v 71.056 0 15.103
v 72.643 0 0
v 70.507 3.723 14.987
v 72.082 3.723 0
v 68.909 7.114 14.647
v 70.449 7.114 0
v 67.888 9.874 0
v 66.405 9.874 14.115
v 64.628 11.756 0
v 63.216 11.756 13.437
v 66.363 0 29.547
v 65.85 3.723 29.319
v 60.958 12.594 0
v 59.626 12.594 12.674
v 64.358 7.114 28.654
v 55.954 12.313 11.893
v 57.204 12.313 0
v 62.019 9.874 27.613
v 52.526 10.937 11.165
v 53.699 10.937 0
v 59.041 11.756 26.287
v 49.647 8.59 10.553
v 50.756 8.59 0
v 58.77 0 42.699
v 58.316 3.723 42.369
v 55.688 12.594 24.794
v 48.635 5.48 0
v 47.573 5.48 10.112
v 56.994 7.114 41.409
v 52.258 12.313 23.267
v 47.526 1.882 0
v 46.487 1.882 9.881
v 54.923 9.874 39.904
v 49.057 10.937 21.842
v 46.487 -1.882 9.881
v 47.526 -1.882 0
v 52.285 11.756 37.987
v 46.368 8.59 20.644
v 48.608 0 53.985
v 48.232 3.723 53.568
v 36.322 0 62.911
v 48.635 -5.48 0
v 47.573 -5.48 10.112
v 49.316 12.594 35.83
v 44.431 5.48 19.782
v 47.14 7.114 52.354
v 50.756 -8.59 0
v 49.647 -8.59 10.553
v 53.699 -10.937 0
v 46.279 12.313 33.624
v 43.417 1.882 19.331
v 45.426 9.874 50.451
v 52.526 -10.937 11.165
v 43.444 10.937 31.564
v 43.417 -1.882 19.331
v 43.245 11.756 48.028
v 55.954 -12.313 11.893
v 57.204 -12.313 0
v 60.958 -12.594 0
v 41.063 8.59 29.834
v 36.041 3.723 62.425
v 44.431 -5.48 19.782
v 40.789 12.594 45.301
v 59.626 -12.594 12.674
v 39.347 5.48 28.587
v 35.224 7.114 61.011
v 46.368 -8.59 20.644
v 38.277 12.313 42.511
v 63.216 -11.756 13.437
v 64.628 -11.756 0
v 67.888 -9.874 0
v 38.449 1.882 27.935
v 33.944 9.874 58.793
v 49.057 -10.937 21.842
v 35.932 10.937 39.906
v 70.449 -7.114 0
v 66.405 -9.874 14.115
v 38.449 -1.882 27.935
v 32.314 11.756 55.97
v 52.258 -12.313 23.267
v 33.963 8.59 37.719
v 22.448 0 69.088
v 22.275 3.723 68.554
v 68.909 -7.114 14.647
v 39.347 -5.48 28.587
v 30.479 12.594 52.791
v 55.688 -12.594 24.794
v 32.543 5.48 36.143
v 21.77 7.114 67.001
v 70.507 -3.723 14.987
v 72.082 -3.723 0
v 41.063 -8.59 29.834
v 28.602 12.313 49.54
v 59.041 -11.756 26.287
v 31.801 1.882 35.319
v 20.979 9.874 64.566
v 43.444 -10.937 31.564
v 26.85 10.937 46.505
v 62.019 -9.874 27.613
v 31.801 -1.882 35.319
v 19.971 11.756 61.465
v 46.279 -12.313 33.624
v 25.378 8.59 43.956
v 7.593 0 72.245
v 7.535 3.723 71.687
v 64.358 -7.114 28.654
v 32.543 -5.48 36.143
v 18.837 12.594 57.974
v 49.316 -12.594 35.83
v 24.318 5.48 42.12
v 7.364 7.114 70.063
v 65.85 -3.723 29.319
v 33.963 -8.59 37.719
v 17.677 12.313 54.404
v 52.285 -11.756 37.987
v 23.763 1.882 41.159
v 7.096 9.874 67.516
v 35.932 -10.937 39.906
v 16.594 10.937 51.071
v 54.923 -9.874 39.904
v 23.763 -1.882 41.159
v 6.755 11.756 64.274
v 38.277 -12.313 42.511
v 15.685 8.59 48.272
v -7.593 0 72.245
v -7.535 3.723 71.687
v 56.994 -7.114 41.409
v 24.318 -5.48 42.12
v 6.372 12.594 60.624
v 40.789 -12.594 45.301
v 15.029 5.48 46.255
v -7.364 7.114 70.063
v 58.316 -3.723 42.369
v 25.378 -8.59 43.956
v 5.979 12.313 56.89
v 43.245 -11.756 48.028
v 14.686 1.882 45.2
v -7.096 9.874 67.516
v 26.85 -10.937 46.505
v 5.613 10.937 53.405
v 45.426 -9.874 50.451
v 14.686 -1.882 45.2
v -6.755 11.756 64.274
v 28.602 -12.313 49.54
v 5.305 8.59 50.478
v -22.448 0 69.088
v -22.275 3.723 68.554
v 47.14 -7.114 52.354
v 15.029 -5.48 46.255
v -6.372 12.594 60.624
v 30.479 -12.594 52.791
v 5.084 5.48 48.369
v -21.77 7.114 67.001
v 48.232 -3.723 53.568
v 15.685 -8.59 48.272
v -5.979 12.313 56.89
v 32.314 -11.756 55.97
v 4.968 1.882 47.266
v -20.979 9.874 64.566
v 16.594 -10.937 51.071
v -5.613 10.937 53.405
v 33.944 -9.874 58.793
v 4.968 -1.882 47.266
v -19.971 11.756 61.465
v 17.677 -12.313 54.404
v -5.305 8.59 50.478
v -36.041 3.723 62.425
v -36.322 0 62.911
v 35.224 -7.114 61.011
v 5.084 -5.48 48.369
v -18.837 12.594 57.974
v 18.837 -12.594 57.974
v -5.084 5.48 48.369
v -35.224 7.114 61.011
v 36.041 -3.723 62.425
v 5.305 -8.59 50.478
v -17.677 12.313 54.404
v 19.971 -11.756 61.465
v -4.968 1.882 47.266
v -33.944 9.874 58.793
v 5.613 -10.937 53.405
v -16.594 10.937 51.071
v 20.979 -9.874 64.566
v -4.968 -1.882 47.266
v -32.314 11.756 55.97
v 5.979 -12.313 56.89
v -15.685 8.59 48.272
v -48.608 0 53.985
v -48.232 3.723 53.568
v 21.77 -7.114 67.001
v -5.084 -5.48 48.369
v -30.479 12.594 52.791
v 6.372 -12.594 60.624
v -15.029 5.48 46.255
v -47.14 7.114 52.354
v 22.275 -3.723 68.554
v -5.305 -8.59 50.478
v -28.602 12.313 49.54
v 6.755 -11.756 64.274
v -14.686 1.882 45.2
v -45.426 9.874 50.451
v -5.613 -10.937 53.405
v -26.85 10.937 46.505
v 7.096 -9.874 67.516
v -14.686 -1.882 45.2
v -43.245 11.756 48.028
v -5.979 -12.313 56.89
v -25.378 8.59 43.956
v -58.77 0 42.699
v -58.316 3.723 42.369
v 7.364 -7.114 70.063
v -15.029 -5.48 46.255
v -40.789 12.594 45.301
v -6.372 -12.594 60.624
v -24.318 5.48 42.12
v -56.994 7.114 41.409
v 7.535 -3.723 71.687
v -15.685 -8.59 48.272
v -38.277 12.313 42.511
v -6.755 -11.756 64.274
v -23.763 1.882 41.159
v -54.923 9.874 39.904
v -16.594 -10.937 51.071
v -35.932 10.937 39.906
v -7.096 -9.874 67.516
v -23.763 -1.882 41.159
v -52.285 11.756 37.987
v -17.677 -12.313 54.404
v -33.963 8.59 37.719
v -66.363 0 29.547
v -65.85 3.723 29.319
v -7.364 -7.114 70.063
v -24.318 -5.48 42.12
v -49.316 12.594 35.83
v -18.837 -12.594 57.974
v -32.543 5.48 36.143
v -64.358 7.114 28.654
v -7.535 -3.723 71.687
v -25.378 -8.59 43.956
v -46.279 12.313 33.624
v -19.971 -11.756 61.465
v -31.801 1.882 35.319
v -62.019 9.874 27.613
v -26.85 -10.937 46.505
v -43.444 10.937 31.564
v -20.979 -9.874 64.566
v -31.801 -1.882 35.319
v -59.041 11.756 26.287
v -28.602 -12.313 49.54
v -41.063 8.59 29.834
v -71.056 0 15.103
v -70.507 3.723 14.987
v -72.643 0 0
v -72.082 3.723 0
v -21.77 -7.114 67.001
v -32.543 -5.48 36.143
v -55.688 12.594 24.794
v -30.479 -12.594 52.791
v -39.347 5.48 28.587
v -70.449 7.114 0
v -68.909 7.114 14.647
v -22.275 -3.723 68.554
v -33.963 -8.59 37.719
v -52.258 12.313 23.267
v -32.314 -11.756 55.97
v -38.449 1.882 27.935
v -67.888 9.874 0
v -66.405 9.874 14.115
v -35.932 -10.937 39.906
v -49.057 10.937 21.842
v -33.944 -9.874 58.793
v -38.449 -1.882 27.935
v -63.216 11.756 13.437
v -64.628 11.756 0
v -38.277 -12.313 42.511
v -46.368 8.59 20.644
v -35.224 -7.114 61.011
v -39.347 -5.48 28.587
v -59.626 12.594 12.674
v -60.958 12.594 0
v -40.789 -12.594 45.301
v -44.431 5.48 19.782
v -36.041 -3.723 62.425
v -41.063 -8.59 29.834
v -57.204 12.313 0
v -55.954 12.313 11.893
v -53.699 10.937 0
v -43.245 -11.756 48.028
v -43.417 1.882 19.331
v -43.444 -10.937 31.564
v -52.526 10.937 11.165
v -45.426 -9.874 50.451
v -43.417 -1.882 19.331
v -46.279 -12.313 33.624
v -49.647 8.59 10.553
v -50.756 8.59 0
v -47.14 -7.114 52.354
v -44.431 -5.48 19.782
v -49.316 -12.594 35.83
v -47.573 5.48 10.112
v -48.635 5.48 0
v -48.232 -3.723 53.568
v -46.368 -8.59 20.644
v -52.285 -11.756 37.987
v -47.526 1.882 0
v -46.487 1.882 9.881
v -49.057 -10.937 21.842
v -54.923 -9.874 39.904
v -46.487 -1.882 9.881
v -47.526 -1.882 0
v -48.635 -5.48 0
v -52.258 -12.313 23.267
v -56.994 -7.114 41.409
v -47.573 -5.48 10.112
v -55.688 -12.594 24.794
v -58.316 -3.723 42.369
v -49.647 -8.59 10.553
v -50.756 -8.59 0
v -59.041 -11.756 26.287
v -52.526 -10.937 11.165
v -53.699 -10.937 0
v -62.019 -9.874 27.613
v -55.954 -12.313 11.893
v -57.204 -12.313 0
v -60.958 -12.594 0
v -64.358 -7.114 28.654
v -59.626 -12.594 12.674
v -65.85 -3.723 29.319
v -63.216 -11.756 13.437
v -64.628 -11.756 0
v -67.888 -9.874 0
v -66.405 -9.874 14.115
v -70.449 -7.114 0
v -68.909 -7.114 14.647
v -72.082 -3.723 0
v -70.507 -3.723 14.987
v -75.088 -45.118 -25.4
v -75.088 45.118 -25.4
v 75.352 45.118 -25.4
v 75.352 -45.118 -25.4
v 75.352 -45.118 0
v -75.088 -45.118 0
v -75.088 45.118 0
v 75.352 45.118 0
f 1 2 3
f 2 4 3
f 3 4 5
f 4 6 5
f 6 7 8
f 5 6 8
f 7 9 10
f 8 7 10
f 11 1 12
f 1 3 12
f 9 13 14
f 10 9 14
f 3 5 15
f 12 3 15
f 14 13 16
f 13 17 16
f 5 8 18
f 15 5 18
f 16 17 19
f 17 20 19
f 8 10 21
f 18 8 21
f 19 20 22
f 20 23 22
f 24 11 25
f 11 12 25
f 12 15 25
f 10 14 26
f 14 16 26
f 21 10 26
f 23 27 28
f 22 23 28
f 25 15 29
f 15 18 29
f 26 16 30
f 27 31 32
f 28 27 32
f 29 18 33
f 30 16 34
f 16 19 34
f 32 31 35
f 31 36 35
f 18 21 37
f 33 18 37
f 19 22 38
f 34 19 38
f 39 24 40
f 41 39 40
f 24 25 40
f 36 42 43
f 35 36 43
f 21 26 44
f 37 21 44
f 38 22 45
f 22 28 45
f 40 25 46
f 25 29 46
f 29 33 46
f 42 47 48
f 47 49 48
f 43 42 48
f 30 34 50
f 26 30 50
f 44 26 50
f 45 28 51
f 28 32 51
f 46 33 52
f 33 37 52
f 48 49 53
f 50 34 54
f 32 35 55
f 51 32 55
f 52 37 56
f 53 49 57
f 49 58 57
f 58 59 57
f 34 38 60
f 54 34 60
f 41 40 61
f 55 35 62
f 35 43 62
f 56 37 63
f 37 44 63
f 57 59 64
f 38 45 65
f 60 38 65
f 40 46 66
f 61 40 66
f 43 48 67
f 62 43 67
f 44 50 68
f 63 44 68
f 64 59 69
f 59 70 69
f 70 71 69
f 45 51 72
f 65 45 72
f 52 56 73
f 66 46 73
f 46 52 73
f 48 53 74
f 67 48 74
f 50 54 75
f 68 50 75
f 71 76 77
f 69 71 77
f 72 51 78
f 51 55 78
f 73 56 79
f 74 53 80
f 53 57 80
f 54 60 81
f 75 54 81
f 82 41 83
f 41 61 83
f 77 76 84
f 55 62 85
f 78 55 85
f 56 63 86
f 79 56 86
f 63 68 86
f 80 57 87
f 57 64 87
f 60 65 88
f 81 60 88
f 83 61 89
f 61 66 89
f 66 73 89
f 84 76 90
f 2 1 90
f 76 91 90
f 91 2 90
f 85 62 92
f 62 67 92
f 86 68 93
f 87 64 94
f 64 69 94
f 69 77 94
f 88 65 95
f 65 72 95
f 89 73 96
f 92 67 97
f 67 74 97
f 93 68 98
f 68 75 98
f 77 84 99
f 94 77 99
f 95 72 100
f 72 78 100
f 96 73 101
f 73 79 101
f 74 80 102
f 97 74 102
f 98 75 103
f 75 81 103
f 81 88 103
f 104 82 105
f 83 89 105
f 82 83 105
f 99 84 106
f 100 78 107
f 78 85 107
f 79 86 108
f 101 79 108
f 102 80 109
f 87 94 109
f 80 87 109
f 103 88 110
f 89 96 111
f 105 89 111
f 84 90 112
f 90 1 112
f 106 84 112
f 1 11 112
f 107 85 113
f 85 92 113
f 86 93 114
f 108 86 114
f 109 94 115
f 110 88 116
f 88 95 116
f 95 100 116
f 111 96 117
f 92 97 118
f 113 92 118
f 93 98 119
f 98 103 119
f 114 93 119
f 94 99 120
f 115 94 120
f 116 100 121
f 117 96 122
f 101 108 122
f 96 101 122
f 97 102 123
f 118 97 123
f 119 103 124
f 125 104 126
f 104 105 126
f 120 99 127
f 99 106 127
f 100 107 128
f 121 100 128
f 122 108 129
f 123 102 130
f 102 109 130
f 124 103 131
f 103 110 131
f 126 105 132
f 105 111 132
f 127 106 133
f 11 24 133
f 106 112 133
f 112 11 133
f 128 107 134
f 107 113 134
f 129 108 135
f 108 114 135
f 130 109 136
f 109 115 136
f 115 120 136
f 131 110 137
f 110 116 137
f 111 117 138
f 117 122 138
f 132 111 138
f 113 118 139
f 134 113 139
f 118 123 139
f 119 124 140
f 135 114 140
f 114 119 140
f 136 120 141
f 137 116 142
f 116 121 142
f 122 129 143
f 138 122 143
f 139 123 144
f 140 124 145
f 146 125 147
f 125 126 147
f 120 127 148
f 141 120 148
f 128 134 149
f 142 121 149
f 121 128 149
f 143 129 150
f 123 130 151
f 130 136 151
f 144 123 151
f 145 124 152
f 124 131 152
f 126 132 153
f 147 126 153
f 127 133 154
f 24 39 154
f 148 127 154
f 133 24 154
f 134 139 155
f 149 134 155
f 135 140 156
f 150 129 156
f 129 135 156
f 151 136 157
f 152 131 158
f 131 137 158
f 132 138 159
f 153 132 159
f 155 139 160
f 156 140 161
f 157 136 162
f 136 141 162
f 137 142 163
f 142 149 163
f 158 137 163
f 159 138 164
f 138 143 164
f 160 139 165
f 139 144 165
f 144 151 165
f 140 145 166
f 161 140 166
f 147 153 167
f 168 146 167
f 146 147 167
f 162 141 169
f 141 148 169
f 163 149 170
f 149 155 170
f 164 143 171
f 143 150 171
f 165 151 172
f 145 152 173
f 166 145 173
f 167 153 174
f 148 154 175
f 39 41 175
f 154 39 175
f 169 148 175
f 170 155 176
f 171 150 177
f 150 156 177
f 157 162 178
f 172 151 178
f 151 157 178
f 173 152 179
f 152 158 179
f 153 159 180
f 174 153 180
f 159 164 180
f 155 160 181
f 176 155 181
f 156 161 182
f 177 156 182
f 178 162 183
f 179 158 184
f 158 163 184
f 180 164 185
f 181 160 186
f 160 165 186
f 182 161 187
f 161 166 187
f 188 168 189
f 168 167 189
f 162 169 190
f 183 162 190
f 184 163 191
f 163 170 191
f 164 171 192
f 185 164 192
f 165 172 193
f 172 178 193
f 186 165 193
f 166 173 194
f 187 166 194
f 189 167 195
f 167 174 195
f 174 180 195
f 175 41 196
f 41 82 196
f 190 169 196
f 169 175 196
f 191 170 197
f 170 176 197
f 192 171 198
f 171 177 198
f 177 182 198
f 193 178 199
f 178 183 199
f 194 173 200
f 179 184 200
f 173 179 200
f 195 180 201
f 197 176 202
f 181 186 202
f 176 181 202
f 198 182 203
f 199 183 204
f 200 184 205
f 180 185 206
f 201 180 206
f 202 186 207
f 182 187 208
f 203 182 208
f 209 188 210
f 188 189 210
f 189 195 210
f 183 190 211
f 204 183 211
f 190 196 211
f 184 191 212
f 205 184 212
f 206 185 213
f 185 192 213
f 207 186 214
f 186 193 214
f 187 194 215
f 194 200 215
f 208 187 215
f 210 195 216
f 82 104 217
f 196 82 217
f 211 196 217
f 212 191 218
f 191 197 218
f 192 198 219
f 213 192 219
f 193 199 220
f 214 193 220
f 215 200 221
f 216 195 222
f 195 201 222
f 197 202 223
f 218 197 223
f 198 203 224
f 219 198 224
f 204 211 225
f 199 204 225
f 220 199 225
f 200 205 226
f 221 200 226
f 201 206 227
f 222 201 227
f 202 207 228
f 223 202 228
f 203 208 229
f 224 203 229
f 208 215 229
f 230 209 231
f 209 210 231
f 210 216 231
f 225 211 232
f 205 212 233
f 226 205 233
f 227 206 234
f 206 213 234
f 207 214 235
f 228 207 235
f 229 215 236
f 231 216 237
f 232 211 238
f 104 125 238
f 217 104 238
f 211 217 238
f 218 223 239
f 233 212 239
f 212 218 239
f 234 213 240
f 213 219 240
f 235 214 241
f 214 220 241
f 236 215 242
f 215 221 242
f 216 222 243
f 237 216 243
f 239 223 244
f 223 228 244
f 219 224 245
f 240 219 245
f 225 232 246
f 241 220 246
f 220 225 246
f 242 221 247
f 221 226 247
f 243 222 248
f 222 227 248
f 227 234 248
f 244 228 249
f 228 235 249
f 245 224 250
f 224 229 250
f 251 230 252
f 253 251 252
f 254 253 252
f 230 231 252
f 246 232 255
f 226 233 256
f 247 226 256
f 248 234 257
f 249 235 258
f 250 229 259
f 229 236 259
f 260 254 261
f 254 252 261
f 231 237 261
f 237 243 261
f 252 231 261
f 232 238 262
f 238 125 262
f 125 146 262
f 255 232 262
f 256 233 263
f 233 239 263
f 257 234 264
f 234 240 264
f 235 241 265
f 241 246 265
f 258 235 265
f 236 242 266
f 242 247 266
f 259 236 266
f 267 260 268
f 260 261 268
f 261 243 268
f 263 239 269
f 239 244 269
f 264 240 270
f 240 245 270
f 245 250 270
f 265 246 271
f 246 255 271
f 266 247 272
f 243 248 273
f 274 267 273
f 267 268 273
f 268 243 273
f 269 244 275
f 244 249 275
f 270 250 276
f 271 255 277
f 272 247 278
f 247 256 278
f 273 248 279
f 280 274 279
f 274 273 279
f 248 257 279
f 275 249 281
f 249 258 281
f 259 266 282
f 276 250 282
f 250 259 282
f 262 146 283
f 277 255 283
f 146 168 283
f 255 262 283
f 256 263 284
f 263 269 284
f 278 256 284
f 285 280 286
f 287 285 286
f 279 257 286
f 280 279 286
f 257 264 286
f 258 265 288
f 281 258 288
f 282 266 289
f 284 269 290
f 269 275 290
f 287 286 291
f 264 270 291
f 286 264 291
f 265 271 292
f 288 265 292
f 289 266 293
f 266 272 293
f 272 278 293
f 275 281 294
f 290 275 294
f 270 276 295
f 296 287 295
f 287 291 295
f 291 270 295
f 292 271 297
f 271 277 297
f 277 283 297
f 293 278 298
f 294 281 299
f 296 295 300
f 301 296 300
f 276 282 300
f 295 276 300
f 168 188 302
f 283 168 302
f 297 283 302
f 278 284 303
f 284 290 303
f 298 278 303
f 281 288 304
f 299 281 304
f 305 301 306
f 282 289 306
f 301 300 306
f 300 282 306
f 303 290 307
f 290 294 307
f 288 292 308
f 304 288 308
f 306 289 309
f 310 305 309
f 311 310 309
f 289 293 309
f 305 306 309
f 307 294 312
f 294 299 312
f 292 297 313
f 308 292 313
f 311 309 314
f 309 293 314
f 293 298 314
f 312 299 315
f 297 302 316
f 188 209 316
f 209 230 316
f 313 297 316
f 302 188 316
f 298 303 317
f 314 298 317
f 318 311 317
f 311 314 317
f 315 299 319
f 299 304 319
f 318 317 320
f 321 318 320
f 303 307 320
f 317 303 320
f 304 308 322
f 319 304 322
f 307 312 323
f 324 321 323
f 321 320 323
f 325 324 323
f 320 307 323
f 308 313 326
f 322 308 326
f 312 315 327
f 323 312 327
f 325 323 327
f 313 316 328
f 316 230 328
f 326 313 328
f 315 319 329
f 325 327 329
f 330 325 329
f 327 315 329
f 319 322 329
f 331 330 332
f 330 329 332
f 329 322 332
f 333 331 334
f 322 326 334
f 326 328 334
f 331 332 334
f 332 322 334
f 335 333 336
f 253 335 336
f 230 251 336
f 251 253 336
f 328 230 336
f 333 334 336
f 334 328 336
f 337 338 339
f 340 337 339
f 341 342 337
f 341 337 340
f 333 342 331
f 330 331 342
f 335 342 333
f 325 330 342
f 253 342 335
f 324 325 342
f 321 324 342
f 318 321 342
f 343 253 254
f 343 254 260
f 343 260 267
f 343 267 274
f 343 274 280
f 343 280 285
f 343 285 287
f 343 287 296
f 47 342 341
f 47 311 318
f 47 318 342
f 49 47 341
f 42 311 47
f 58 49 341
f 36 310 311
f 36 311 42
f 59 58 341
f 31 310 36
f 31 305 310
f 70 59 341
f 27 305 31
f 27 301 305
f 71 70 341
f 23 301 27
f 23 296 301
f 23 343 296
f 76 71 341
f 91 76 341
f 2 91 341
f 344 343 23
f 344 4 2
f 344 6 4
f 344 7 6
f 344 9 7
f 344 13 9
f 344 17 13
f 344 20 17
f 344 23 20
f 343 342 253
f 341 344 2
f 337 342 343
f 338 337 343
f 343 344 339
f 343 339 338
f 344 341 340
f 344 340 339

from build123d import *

# Parameters (mm, degrees)
F0_W     = 75.351886
F0_H     = 90.236254
F0_W_2   = 75.087629
F2_DEPTH = 25.4
F1_R     = 12.629289
F3_ANGLE = -180


with BuildPart() as f2:
    # F0 (on Top) → F2 (new body)
    with BuildSketch(Plane.XY):
        with Locations((37.675943, 0)):
            Rectangle(F0_W, F0_H)
        with Locations((-37.543814, 0)):
            Rectangle(F0_W_2, F0_H)
    extrude(amount=-F2_DEPTH)

    # F1 (on face) → F3 (revolve)
    with BuildSketch(Plane.XY):
        with Locations((60.014084, 0)):
            Circle(F1_R)
    revolve(axis=Axis((0, 0.875765, 0), (0, 1, 0)), revolution_arc=F3_ANGLE)


solid = f2.part
